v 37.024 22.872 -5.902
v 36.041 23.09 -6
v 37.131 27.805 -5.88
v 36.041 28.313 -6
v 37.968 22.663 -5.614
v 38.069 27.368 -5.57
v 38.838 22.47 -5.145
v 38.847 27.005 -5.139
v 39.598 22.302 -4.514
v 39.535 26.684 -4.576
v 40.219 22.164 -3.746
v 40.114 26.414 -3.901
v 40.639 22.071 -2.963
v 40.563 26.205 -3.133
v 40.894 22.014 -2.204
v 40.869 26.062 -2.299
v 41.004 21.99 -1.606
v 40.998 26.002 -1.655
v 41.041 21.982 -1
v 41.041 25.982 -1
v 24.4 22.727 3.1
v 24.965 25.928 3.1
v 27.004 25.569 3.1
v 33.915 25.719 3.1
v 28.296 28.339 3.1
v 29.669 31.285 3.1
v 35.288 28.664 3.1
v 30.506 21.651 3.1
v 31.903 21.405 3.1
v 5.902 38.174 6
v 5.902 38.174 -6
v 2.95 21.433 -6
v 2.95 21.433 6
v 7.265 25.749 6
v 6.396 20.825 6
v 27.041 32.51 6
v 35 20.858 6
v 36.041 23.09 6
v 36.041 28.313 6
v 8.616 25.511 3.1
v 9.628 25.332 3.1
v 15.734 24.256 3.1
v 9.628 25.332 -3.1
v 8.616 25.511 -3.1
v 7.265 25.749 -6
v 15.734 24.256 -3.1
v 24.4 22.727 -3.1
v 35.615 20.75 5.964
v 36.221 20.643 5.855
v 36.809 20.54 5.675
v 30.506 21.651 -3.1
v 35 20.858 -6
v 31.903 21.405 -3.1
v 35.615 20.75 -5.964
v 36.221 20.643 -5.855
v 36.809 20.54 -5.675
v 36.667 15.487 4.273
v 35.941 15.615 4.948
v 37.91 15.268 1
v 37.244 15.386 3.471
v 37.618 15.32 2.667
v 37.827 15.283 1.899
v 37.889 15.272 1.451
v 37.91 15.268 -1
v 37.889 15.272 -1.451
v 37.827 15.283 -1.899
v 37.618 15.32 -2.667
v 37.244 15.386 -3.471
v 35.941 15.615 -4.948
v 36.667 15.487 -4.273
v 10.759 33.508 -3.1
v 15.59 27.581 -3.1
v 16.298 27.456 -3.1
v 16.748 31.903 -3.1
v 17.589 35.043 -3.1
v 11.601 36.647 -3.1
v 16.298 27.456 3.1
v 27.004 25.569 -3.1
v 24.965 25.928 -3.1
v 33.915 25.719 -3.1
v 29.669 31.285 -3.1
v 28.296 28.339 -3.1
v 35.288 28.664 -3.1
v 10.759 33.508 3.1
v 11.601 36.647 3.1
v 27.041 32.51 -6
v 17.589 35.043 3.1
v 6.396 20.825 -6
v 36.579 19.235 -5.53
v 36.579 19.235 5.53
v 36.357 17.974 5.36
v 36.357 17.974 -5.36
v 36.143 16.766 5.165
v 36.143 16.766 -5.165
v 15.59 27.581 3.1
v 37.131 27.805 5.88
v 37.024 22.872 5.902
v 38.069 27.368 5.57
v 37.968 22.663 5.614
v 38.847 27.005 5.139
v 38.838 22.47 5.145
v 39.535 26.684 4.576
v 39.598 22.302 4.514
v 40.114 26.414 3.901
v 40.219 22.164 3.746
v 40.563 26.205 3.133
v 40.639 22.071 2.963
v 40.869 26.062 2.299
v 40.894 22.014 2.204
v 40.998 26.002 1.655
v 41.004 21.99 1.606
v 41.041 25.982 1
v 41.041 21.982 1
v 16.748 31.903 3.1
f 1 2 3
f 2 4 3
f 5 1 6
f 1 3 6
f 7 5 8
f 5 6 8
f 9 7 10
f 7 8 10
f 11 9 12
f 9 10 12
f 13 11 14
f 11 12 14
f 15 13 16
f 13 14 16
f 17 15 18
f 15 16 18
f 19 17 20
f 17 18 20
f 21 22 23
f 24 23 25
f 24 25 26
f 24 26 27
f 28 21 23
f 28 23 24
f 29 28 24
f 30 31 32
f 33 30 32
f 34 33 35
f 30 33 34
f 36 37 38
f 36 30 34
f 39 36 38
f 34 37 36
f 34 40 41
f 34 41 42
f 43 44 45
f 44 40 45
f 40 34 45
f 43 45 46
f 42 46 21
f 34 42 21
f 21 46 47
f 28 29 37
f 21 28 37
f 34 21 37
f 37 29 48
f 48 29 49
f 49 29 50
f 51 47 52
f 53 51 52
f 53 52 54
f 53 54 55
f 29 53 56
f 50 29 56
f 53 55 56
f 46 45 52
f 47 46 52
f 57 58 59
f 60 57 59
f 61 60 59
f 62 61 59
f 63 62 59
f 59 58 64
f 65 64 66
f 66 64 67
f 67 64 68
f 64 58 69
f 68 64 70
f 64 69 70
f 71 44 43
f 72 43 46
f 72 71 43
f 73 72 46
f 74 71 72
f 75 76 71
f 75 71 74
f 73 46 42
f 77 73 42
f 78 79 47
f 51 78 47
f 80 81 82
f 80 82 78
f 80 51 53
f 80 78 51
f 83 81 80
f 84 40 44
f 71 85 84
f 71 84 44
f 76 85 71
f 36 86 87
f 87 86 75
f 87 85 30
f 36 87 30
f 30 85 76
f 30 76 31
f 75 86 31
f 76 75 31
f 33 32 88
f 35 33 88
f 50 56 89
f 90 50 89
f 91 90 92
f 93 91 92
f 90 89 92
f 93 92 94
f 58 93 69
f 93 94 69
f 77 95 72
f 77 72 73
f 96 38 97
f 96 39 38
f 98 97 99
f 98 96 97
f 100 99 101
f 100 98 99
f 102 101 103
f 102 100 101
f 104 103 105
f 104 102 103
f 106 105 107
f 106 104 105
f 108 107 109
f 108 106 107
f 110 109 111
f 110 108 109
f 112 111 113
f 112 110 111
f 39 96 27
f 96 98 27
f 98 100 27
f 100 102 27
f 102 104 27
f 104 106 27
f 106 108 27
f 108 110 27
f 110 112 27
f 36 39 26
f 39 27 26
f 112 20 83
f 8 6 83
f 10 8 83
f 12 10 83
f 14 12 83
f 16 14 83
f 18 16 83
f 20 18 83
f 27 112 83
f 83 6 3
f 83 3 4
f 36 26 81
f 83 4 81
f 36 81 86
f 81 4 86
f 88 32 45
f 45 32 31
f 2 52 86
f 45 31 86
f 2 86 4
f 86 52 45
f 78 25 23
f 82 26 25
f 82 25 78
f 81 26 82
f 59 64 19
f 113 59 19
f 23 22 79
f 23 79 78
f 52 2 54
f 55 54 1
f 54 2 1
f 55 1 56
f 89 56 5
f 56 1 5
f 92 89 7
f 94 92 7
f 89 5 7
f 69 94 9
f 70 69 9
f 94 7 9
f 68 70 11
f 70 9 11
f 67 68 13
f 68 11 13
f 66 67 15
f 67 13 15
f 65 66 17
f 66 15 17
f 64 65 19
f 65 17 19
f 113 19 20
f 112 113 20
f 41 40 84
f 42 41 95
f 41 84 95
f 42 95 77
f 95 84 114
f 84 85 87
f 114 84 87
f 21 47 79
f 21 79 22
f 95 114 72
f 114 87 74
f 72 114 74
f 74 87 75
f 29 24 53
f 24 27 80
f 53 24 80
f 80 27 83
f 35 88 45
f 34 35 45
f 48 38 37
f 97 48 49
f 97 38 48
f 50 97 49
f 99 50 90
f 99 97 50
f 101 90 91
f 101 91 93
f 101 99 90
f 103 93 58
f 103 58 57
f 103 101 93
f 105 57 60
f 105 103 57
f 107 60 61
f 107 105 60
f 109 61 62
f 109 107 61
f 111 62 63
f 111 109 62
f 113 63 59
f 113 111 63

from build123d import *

# Parameters (mm, degrees)
BOSS_EXTRUDE1_DEPTH      = 6
BOSS_EXTRUDE1_DEPTH_BACK = 6
SKETCH2_W                = 6.2
SKETCH2_H                = 6.2
CUT_EXTRUDE1_DEPTH       = 3.25
SKETCH3_W                = 6.2
SKETCH3_H                = 6.2
CUT_EXTRUDE2_DEPTH       = 3.25
SKETCH4_W                = 6.2
SKETCH4_H                = 6.2
CUT_EXTRUDE3_DEPTH       = 3.25
FILLET1_R                = 5
SKETCH5_W                = 6.2
SKETCH5_H                = 6.2
CUT_EXTRUDE4_DEPTH       = 38.489999943
SKETCH6_W                = 6.2
SKETCH6_H                = 6.2
CUT_EXTRUDE5_DEPTH       = 32.982302651


with BuildPart() as part:
    # Sketch1 → Boss-Extrude1 (new, two sides: drawn at the far end of the back side and taken through both)
    with BuildSketch(Plane.XY.offset(-BOSS_EXTRUDE1_DEPTH_BACK)):
        Polygon((5.901614565, 38.174412444), (2.949595544, 21.432680643), (6.39642268, 20.824912021), (7.264663568, 25.748950786), (36.808896158, 20.539505456), (35.94065527, 15.615466691), (37.910270776, 15.268170336), (41.040910113, 21.981848059), (41.040910113, 25.981848059), (27.040910113, 32.510155273), align=None)
    extrude(amount=BOSS_EXTRUDE1_DEPTH + BOSS_EXTRUDE1_DEPTH_BACK)

    # Sketch2 → Cut-Extrude1 (cut)
    with BuildSketch(Plane(origin=(4.622386329, 26.214855554, 0), x_dir=(0.9848077530122067, -0.17364817766693813, 0), z_dir=(-0.17364817766693813, -0.9848077530122067, 0))):
        with Locations((8.183038624, 0)):
            Rectangle(SKETCH2_W, SKETCH2_H)
        with Locations((23.183038624, 0)):
            Rectangle(SKETCH2_W, SKETCH2_H)
    extrude(amount=-CUT_EXTRUDE1_DEPTH, mode=Mode.SUBTRACT)

    # Sketch3 → Cut-Extrude2 (cut)
    with BuildSketch(Plane(origin=(9.938936325, 37.092615339, 0), x_dir=(0.9659258262890682, -0.25881904510252135, 0), z_dir=(0.2588190451025213, 0.9659258262890681, 0))):
        with Locations((4.820256949, 0)):
            Rectangle(SKETCH3_W, SKETCH3_H)
    extrude(amount=-CUT_EXTRUDE2_DEPTH, mode=Mode.SUBTRACT)

    # Sketch4 → Cut-Extrude3 (cut)
    with BuildSketch(Plane(origin=(17.281785965, 37.0609096, 0), x_dir=(0.9063077870366484, -0.42261826174070294, 0), z_dir=(0.42261826174070294, 0.9063077870366484, 0))):
        with Locations((16.768002093, 0)):
            Rectangle(SKETCH4_W, SKETCH4_H)
    extrude(amount=-CUT_EXTRUDE3_DEPTH, mode=Mode.SUBTRACT)

    # Fillet1
    fillet1_edges = [part.edges().sort_by_distance(p)[0] for p in [
        (39.475590445, 18.625009197, -6),
        (41.040910113, 23.981848059, -6),
        (39.475590445, 18.625009197, 6),
        (41.040910113, 23.981848059, 6),
    ]]
    fillet(fillet1_edges, radius=FILLET1_R)

    # Sketch5 → Cut-Extrude4 (cut, through all)
    with BuildSketch(Plane(origin=(9.097774429, 33.953356403, 0), x_dir=(0.9659258262890683, -0.2588190451025211, 0), z_dir=(0.2588190451025211, 0.9659258262890683, 0))):
        with Locations((4.820256949, 0)):
            Rectangle(SKETCH5_W, SKETCH5_H)
    extrude(amount=-CUT_EXTRUDE4_DEPTH, mode=Mode.SUBTRACT)

    # Sketch6 → Cut-Extrude5 (cut, through all)
    with BuildSketch(Plane(origin=(15.908276614, 34.115409292, 0), x_dir=(0.9063077870366483, -0.42261826174070316, 0), z_dir=(0.42261826174070316, 0.9063077870366483, 0))):
        with Locations((16.768002093, 0)):
            Rectangle(SKETCH6_W, SKETCH6_H)
    extrude(amount=-CUT_EXTRUDE5_DEPTH, mode=Mode.SUBTRACT)


solid = part.part
